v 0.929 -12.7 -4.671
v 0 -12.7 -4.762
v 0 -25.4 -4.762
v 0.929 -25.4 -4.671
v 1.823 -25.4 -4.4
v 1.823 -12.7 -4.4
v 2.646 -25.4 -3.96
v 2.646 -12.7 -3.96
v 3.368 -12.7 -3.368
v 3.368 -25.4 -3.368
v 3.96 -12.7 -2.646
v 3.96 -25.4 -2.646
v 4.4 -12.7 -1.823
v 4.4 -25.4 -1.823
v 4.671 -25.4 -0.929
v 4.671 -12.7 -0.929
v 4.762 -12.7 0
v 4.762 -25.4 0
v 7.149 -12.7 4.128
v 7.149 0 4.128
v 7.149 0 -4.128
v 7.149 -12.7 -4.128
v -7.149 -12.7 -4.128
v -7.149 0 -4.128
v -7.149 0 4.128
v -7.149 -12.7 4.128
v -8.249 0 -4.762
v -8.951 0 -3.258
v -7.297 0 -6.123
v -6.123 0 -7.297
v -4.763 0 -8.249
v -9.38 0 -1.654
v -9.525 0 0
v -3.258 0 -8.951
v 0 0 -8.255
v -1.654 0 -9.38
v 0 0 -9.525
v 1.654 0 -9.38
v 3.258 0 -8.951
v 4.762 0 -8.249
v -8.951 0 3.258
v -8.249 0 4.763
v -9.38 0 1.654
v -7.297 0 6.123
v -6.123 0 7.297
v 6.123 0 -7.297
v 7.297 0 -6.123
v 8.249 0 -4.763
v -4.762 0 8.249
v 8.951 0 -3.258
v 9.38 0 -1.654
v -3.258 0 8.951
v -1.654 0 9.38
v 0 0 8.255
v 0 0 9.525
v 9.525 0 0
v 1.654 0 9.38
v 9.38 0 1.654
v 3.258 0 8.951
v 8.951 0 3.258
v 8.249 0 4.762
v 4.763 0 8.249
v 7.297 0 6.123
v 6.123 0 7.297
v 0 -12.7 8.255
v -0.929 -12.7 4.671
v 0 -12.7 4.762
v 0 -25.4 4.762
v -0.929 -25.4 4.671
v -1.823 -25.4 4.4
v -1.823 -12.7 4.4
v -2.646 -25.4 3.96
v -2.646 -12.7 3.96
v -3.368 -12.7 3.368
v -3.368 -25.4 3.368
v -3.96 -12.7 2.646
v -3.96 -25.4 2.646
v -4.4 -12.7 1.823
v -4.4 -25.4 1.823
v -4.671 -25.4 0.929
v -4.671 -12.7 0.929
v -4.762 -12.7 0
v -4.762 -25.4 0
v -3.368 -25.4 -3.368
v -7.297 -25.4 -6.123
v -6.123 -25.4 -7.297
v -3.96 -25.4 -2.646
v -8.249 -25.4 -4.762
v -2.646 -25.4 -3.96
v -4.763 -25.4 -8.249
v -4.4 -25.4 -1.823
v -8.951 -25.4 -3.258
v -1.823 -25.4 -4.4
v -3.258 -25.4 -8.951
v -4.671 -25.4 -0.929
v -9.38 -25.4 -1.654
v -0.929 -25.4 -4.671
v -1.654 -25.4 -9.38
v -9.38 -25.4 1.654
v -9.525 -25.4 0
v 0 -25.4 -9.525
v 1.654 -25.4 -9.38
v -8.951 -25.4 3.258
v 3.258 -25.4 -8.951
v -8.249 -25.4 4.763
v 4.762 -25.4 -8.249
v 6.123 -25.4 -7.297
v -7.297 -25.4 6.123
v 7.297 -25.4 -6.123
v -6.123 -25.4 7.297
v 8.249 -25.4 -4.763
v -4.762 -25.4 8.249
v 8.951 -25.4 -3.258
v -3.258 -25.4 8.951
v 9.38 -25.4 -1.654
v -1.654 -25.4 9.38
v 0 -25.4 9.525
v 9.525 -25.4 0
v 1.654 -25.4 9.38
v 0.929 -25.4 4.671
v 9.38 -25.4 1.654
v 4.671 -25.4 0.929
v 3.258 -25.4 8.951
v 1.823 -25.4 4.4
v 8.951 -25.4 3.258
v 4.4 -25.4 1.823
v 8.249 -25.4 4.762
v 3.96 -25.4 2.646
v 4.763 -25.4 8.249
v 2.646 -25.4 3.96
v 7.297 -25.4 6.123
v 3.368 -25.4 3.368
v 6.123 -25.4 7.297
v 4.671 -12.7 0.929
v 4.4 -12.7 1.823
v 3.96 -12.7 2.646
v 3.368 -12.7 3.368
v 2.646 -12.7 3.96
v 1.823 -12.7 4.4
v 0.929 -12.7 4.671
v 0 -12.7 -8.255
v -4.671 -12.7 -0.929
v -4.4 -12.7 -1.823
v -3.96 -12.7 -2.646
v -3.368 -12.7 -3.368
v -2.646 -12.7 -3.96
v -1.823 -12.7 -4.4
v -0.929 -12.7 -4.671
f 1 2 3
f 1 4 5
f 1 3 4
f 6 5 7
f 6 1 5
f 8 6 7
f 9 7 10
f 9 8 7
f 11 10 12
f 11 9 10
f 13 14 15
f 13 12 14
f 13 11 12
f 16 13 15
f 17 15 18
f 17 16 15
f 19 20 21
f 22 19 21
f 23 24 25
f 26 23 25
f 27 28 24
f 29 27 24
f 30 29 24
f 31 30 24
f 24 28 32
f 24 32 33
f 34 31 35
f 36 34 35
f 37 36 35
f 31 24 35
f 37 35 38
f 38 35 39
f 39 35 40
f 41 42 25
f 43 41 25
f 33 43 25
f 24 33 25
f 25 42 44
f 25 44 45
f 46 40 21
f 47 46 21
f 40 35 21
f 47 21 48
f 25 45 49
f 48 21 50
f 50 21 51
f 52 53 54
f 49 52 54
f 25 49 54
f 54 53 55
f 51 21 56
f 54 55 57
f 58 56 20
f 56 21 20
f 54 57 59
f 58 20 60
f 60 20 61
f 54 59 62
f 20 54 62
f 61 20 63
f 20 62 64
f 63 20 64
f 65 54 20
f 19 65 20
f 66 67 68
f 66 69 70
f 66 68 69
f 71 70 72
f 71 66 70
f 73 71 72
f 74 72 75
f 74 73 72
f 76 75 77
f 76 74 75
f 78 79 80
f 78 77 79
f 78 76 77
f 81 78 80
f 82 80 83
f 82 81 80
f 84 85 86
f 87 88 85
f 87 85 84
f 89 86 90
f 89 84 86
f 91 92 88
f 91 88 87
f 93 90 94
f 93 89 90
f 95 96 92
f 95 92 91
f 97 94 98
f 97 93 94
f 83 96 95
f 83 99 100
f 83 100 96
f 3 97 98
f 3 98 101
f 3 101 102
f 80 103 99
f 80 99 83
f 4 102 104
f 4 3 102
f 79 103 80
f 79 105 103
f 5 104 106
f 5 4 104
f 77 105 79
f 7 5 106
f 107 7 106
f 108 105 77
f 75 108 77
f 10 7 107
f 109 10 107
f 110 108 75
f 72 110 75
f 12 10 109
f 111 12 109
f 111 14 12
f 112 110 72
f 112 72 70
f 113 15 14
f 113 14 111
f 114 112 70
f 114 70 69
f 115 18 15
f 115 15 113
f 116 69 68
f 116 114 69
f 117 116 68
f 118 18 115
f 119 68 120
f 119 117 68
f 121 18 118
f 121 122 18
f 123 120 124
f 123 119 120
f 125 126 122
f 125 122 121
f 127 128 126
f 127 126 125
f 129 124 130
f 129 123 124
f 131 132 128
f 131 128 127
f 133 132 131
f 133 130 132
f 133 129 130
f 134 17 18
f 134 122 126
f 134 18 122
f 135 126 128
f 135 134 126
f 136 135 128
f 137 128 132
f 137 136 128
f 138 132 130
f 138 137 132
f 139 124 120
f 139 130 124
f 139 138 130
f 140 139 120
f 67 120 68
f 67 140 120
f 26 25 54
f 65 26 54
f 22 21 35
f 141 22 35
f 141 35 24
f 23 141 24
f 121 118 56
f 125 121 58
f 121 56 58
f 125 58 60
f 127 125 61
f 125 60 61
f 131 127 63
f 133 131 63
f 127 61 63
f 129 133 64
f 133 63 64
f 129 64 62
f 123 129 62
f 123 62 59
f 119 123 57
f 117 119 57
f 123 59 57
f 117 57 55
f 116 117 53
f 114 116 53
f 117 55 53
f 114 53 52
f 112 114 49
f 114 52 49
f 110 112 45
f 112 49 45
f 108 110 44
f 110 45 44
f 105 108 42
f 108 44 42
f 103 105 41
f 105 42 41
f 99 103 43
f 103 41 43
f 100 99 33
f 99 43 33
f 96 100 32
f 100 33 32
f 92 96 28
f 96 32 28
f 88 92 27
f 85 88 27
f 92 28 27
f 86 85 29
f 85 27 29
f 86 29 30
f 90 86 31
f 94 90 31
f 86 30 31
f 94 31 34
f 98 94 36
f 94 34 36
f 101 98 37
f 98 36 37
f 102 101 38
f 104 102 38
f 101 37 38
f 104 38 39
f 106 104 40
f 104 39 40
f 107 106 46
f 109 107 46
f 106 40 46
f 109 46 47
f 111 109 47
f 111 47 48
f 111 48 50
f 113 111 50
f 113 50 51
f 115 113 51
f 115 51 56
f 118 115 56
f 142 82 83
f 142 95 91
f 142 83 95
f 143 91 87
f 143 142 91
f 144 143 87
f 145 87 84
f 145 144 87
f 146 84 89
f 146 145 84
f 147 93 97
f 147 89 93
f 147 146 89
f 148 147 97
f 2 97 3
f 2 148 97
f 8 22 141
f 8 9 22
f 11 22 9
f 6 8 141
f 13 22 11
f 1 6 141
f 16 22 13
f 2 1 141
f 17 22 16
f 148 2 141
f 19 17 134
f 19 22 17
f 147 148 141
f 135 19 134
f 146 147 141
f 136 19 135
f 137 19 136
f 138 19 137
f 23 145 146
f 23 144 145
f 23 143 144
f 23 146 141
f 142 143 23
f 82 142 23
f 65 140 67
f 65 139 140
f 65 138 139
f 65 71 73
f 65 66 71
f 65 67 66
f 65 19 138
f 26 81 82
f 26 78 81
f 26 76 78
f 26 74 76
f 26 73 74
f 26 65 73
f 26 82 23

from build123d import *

# Parameters (mm, degrees)
F0_R     = 9.525
F1_DEPTH = 25.4
F3_DEPTH = 25.4
F5_DEPTH = 25.401
F6_DEPTH = 9.525
F8_DEPTH = 12.7


with BuildPart() as f1:
    # F0 (on Front) → F1 (new body)
    with BuildSketch(Plane.XZ):
        Circle(F0_R)
    extrude(amount=F1_DEPTH)

    # F2 (on Front) → F3 (join)
    with BuildSketch(Plane.XZ):
        with BuildLine():
            Line((0, -4.7625), (4.7625, -4.7625))
            Line((4.7625, -4.7625), (4.7625, 0))
            ThreePointArc((4.7625, 0), (3.367596, -3.367596), (0, -4.7625))
        make_face()
        with BuildLine():
            Line((-4.7625, -4.7625), (0, -4.7625))
            ThreePointArc((0, -4.7625), (-3.367596, -3.367596), (-4.7625, 0))
            Line((-4.7625, 0), (-4.7625, -4.7625))
        make_face()
        with BuildLine():
            ThreePointArc((0, 4.7625), (3.367596, 3.367596), (4.7625, 0))
            Line((4.7625, 0), (4.7625, 4.7625))
            Line((4.7625, 4.7625), (0, 4.7625))
        make_face()
        with BuildLine():
            Line((-4.7625, 4.7625), (-4.7625, 0))
            ThreePointArc((-4.7625, 0), (-3.367596, 3.367596), (0, 4.7625))
            Line((0, 4.7625), (-4.7625, 4.7625))
        make_face()
    extrude(amount=F3_DEPTH)

    # F4 (on Front) → F5 (cut, through all)
    with BuildSketch(Plane.XZ):
        with BuildLine():
            ThreePointArc((-4.7625, 0), (-3.367596, -3.367596), (0, -4.7625))
            ThreePointArc((0, -4.7625), (3.367596, -3.367596), (4.7625, 0))
            ThreePointArc((4.7625, 0), (3.367596, 3.367596), (0, 4.7625))
            ThreePointArc((0, 4.7625), (-3.367596, 3.367596), (-4.7625, 0))
        make_face()
    extrude(amount=F5_DEPTH, mode=Mode.SUBTRACT)

    # F4 (on Front) → F6 (cut)
    with BuildSketch(Plane.XZ):
        with BuildLine():
            Line((0, -4.7625), (4.7625, -4.7625))
            Line((4.7625, -4.7625), (4.7625, 0))
            ThreePointArc((4.7625, 0), (3.367596, -3.367596), (0, -4.7625))
        make_face()
        with BuildLine():
            Line((-4.7625, -4.7625), (0, -4.7625))
            ThreePointArc((0, -4.7625), (-3.367596, -3.367596), (-4.7625, 0))
            Line((-4.7625, 0), (-4.7625, -4.7625))
        make_face()
        with BuildLine():
            ThreePointArc((0, 4.7625), (3.367596, 3.367596), (4.7625, 0))
            Line((4.7625, 0), (4.7625, 4.7625))
            Line((4.7625, 4.7625), (0, 4.7625))
        make_face()
        with BuildLine():
            Line((-4.7625, 4.7625), (-4.7625, 0))
            ThreePointArc((-4.7625, 0), (-3.367596, 3.367596), (0, 4.7625))
            Line((0, 4.7625), (-4.7625, 4.7625))
        make_face()
    extrude(amount=F6_DEPTH, mode=Mode.SUBTRACT)

    # F7 (on face) → F8 (cut)
    with BuildSketch(Plane(origin=(0, 0, 0), x_dir=(-1, 0, 0), z_dir=(0, 1, 0))):
        Polygon((7.14904, -4.1275), (7.14904, 4.1275), (0, 8.255), (-7.14904, 4.1275), (-7.14904, -4.1275), (0, -8.255), align=None)
    extrude(amount=-F8_DEPTH, mode=Mode.SUBTRACT)


solid = f1.part
